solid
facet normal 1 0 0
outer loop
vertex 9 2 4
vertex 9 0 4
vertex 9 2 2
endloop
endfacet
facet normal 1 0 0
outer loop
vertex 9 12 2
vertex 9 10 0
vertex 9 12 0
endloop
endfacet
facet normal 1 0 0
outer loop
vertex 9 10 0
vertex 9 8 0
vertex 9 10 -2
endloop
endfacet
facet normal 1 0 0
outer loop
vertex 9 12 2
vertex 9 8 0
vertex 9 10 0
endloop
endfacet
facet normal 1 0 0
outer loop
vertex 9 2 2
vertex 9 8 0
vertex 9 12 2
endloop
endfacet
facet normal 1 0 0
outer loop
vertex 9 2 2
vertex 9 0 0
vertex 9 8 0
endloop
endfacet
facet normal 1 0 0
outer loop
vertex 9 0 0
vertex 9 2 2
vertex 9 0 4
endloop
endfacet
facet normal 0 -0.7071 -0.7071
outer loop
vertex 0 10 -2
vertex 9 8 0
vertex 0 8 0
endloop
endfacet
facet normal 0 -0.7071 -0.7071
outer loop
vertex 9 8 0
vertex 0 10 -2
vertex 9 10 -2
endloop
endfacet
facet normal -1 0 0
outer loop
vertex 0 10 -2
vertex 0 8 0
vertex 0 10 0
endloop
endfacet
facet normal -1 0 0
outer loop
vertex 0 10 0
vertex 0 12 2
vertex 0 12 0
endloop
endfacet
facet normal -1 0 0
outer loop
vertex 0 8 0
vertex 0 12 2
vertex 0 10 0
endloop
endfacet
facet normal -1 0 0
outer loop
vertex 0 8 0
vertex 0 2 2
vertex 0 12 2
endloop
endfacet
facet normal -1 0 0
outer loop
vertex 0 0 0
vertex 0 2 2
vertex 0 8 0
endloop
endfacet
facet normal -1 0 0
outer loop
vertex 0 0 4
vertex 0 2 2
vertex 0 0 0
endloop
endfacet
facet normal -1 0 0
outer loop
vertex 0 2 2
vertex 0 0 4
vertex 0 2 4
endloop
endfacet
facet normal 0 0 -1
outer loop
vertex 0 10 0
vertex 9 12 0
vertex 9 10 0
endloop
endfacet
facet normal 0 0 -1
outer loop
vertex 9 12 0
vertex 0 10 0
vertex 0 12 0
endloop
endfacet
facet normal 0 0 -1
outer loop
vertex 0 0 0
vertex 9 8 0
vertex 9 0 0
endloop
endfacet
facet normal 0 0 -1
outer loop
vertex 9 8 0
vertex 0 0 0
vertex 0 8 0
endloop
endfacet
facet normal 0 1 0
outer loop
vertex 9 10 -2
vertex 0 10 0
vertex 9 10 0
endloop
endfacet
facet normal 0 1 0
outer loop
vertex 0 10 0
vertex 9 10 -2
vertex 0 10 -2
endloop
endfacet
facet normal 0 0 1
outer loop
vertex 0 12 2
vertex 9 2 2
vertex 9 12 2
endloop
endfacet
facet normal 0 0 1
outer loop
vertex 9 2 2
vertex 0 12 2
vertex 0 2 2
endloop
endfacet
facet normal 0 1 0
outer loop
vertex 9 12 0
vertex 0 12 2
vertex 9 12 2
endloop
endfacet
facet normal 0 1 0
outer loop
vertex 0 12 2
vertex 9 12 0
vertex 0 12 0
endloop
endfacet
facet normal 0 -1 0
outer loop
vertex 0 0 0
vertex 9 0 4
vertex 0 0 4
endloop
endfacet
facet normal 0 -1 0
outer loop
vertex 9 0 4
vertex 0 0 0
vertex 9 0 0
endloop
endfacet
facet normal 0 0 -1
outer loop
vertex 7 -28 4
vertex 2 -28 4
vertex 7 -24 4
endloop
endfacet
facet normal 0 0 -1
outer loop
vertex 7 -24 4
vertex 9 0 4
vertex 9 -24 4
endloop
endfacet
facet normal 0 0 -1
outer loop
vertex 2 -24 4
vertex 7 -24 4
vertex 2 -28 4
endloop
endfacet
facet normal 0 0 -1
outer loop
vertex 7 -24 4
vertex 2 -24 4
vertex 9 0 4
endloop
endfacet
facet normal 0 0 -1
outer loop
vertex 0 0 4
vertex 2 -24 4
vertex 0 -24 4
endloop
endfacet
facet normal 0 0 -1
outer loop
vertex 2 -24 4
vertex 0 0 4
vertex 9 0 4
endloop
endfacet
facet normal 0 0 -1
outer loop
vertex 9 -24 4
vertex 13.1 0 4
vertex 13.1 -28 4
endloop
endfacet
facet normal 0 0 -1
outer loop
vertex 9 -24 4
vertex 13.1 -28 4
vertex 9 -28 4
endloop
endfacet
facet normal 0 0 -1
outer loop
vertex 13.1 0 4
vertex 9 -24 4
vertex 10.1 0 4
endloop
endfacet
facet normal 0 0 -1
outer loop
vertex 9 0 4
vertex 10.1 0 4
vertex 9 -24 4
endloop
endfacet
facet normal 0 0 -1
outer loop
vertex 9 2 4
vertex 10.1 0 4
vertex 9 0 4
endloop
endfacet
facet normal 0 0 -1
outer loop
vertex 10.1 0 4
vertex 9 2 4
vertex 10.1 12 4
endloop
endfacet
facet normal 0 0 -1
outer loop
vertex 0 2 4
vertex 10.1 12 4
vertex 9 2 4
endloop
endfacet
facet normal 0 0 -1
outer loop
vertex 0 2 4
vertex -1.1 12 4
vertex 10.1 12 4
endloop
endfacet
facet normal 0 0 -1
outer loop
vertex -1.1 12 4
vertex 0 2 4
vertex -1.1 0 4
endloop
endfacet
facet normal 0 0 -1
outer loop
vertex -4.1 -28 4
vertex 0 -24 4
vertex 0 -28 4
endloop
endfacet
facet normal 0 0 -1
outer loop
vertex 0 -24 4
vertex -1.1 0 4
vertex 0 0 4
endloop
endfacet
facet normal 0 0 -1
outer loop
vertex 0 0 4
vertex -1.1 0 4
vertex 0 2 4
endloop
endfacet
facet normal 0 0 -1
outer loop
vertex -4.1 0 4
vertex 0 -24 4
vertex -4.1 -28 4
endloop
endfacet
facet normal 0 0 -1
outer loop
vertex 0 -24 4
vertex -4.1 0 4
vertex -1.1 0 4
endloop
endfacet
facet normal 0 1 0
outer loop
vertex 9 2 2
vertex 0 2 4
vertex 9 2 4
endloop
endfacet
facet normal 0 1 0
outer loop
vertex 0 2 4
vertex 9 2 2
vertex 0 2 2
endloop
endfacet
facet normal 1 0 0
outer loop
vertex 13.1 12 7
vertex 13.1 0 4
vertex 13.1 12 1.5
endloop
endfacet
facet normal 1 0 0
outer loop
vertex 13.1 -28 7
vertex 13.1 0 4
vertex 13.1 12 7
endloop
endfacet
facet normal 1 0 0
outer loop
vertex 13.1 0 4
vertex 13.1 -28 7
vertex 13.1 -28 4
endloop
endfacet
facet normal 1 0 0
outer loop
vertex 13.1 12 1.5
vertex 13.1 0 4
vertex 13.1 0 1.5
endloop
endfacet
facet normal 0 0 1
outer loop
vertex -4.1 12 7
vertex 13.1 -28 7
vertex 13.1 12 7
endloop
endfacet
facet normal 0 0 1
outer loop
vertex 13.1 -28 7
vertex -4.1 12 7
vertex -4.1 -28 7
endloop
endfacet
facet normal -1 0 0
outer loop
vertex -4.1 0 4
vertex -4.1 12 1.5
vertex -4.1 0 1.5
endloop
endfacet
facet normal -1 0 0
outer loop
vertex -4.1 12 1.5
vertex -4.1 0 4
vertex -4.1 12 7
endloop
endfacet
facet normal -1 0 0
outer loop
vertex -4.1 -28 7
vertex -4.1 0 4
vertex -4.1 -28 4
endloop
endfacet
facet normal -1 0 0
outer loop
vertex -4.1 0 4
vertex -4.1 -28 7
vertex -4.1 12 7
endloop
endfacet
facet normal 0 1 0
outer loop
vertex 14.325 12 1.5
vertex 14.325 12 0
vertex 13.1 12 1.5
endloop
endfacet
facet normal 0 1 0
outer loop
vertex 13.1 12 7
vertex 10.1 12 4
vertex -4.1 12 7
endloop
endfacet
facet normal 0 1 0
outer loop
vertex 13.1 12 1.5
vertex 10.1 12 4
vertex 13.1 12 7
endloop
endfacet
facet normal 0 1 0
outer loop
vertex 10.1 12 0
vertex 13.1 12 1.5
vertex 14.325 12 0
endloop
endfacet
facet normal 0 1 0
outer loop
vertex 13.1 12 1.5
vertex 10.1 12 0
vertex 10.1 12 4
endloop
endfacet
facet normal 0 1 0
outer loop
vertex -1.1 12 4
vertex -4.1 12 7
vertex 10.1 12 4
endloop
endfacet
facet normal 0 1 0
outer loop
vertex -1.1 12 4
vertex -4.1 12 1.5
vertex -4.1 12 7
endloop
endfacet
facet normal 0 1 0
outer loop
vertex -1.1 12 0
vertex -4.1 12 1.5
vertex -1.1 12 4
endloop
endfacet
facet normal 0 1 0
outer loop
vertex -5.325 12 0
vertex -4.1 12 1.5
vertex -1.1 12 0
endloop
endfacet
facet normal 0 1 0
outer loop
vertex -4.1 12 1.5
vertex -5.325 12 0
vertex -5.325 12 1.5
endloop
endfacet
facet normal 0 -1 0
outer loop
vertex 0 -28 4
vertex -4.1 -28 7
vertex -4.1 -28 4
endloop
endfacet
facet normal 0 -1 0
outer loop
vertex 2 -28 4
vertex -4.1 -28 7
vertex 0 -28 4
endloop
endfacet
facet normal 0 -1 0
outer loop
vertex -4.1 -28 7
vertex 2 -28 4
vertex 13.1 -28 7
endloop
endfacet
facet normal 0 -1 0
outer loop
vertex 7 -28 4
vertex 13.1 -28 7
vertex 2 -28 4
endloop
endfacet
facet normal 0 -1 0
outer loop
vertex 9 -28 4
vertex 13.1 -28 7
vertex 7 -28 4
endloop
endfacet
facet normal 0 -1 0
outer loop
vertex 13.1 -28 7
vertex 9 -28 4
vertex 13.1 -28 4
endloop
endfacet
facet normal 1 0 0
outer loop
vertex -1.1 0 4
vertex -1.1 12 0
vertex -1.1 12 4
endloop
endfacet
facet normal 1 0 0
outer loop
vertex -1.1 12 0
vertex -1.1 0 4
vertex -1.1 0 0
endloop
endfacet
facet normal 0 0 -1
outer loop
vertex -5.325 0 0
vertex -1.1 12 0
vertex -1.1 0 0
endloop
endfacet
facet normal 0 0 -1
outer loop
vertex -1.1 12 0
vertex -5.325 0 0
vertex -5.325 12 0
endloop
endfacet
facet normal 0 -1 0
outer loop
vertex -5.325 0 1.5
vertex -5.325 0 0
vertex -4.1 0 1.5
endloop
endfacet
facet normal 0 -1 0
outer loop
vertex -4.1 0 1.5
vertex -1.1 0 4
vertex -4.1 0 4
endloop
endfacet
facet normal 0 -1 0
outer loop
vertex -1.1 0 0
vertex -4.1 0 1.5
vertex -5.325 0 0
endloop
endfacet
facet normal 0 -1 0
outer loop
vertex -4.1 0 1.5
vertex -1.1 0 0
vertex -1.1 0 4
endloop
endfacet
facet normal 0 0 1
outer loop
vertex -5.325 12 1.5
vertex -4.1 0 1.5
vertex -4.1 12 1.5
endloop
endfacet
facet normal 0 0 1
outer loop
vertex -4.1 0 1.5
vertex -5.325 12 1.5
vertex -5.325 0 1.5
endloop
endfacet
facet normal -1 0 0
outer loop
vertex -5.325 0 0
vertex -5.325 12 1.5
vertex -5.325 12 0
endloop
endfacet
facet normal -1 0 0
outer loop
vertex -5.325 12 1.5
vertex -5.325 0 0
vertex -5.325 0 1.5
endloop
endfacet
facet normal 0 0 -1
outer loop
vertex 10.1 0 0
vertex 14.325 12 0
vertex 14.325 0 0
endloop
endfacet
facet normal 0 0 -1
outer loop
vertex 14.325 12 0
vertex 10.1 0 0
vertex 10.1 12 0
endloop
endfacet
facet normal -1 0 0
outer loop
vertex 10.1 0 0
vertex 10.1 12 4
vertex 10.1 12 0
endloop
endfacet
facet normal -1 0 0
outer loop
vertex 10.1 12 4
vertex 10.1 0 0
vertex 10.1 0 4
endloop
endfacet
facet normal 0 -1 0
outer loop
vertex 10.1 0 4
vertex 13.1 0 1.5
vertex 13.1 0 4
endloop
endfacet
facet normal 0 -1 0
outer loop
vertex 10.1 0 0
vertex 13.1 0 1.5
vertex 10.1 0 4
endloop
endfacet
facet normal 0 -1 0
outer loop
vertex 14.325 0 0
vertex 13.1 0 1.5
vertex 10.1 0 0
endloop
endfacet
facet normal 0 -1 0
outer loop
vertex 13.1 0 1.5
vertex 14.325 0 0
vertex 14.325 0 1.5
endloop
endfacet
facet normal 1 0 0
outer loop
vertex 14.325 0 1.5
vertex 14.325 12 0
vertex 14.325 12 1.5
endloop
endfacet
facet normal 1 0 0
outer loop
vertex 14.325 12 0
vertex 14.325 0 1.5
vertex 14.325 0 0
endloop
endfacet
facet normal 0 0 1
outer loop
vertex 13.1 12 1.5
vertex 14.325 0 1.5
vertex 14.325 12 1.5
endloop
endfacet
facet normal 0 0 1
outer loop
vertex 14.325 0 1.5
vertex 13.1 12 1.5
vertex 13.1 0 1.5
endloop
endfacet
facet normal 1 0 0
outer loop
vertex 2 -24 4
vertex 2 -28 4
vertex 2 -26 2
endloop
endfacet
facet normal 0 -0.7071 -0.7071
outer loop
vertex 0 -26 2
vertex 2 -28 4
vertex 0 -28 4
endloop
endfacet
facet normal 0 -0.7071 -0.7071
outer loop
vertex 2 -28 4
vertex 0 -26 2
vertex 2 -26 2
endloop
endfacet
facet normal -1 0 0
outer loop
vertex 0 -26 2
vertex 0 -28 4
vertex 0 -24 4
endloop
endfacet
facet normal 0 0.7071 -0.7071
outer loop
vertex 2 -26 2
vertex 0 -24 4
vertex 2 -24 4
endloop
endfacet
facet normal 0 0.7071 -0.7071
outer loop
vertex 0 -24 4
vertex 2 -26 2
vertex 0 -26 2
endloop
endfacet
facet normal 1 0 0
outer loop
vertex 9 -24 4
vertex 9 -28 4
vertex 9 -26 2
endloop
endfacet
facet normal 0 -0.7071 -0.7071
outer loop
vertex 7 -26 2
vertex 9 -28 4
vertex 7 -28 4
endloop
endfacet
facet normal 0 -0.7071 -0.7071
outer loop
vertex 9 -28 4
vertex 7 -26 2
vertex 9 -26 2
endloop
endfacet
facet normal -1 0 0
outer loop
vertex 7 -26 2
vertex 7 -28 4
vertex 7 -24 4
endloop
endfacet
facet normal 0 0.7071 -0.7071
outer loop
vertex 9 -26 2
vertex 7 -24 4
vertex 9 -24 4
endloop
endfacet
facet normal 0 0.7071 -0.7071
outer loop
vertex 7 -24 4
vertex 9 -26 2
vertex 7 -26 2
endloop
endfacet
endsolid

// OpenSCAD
clip_width = 9;
clip_lip_position = 10;
clip_height = clip_lip_position + 2;
clip_thickness = 2;

width = 17.2;
width_lip = 19.65;
length = 40;
thickness = 3;
shimmy_thickness = 1.5;

//The clip.
cube([clip_width, clip_height, clip_thickness]);
difference() { //The lip.
	translate([0, clip_lip_position - clip_thickness, 0]) {
		rotate([-45, 0, 0]) {
			cube([clip_width, sqrt(2) * clip_thickness, sqrt(2) * clip_thickness]);
		}
	}
	translate([0, clip_lip_position, -clip_thickness]) {
		cube([clip_width, clip_thickness, clip_thickness]);
	}
}
translate([0, 0, clip_thickness]) {
	cube([clip_width, clip_thickness, clip_thickness]);
}

//The main body.
offset_x = -(width - clip_width) / 2;
translate([offset_x, -length + clip_height, clip_thickness * 2]) {
	cube([width, length, thickness]);
}
translate([offset_x, 0, 0]) {
	cube([thickness, clip_height, clip_thickness * 2]);
}
translate([-(width_lip - clip_width) / 2, 0, 0]) {
	cube([(width_lip - width) / 2, clip_height, shimmy_thickness]);
}
translate([offset_x + width - thickness, 0, 0]) {
	cube([thickness, clip_height, clip_thickness * 2]);
}
translate([offset_x + width, 0, 0]) {
	cube([(width_lip - width) / 2, clip_height, shimmy_thickness]);
}
translate([0, -length + clip_height, clip_thickness * 2]) {
	rotate([-45, 0, 0]) {
		cube([clip_thickness, sqrt(2) * clip_thickness, sqrt(2) * clip_thickness]);
	}
}
translate([clip_width - clip_thickness, -length + clip_height, clip_thickness * 2]) {
	rotate([-45, 0, 0]) {
		cube([clip_thickness, sqrt(2) * clip_thickness, sqrt(2) * clip_thickness]);
	}
}
